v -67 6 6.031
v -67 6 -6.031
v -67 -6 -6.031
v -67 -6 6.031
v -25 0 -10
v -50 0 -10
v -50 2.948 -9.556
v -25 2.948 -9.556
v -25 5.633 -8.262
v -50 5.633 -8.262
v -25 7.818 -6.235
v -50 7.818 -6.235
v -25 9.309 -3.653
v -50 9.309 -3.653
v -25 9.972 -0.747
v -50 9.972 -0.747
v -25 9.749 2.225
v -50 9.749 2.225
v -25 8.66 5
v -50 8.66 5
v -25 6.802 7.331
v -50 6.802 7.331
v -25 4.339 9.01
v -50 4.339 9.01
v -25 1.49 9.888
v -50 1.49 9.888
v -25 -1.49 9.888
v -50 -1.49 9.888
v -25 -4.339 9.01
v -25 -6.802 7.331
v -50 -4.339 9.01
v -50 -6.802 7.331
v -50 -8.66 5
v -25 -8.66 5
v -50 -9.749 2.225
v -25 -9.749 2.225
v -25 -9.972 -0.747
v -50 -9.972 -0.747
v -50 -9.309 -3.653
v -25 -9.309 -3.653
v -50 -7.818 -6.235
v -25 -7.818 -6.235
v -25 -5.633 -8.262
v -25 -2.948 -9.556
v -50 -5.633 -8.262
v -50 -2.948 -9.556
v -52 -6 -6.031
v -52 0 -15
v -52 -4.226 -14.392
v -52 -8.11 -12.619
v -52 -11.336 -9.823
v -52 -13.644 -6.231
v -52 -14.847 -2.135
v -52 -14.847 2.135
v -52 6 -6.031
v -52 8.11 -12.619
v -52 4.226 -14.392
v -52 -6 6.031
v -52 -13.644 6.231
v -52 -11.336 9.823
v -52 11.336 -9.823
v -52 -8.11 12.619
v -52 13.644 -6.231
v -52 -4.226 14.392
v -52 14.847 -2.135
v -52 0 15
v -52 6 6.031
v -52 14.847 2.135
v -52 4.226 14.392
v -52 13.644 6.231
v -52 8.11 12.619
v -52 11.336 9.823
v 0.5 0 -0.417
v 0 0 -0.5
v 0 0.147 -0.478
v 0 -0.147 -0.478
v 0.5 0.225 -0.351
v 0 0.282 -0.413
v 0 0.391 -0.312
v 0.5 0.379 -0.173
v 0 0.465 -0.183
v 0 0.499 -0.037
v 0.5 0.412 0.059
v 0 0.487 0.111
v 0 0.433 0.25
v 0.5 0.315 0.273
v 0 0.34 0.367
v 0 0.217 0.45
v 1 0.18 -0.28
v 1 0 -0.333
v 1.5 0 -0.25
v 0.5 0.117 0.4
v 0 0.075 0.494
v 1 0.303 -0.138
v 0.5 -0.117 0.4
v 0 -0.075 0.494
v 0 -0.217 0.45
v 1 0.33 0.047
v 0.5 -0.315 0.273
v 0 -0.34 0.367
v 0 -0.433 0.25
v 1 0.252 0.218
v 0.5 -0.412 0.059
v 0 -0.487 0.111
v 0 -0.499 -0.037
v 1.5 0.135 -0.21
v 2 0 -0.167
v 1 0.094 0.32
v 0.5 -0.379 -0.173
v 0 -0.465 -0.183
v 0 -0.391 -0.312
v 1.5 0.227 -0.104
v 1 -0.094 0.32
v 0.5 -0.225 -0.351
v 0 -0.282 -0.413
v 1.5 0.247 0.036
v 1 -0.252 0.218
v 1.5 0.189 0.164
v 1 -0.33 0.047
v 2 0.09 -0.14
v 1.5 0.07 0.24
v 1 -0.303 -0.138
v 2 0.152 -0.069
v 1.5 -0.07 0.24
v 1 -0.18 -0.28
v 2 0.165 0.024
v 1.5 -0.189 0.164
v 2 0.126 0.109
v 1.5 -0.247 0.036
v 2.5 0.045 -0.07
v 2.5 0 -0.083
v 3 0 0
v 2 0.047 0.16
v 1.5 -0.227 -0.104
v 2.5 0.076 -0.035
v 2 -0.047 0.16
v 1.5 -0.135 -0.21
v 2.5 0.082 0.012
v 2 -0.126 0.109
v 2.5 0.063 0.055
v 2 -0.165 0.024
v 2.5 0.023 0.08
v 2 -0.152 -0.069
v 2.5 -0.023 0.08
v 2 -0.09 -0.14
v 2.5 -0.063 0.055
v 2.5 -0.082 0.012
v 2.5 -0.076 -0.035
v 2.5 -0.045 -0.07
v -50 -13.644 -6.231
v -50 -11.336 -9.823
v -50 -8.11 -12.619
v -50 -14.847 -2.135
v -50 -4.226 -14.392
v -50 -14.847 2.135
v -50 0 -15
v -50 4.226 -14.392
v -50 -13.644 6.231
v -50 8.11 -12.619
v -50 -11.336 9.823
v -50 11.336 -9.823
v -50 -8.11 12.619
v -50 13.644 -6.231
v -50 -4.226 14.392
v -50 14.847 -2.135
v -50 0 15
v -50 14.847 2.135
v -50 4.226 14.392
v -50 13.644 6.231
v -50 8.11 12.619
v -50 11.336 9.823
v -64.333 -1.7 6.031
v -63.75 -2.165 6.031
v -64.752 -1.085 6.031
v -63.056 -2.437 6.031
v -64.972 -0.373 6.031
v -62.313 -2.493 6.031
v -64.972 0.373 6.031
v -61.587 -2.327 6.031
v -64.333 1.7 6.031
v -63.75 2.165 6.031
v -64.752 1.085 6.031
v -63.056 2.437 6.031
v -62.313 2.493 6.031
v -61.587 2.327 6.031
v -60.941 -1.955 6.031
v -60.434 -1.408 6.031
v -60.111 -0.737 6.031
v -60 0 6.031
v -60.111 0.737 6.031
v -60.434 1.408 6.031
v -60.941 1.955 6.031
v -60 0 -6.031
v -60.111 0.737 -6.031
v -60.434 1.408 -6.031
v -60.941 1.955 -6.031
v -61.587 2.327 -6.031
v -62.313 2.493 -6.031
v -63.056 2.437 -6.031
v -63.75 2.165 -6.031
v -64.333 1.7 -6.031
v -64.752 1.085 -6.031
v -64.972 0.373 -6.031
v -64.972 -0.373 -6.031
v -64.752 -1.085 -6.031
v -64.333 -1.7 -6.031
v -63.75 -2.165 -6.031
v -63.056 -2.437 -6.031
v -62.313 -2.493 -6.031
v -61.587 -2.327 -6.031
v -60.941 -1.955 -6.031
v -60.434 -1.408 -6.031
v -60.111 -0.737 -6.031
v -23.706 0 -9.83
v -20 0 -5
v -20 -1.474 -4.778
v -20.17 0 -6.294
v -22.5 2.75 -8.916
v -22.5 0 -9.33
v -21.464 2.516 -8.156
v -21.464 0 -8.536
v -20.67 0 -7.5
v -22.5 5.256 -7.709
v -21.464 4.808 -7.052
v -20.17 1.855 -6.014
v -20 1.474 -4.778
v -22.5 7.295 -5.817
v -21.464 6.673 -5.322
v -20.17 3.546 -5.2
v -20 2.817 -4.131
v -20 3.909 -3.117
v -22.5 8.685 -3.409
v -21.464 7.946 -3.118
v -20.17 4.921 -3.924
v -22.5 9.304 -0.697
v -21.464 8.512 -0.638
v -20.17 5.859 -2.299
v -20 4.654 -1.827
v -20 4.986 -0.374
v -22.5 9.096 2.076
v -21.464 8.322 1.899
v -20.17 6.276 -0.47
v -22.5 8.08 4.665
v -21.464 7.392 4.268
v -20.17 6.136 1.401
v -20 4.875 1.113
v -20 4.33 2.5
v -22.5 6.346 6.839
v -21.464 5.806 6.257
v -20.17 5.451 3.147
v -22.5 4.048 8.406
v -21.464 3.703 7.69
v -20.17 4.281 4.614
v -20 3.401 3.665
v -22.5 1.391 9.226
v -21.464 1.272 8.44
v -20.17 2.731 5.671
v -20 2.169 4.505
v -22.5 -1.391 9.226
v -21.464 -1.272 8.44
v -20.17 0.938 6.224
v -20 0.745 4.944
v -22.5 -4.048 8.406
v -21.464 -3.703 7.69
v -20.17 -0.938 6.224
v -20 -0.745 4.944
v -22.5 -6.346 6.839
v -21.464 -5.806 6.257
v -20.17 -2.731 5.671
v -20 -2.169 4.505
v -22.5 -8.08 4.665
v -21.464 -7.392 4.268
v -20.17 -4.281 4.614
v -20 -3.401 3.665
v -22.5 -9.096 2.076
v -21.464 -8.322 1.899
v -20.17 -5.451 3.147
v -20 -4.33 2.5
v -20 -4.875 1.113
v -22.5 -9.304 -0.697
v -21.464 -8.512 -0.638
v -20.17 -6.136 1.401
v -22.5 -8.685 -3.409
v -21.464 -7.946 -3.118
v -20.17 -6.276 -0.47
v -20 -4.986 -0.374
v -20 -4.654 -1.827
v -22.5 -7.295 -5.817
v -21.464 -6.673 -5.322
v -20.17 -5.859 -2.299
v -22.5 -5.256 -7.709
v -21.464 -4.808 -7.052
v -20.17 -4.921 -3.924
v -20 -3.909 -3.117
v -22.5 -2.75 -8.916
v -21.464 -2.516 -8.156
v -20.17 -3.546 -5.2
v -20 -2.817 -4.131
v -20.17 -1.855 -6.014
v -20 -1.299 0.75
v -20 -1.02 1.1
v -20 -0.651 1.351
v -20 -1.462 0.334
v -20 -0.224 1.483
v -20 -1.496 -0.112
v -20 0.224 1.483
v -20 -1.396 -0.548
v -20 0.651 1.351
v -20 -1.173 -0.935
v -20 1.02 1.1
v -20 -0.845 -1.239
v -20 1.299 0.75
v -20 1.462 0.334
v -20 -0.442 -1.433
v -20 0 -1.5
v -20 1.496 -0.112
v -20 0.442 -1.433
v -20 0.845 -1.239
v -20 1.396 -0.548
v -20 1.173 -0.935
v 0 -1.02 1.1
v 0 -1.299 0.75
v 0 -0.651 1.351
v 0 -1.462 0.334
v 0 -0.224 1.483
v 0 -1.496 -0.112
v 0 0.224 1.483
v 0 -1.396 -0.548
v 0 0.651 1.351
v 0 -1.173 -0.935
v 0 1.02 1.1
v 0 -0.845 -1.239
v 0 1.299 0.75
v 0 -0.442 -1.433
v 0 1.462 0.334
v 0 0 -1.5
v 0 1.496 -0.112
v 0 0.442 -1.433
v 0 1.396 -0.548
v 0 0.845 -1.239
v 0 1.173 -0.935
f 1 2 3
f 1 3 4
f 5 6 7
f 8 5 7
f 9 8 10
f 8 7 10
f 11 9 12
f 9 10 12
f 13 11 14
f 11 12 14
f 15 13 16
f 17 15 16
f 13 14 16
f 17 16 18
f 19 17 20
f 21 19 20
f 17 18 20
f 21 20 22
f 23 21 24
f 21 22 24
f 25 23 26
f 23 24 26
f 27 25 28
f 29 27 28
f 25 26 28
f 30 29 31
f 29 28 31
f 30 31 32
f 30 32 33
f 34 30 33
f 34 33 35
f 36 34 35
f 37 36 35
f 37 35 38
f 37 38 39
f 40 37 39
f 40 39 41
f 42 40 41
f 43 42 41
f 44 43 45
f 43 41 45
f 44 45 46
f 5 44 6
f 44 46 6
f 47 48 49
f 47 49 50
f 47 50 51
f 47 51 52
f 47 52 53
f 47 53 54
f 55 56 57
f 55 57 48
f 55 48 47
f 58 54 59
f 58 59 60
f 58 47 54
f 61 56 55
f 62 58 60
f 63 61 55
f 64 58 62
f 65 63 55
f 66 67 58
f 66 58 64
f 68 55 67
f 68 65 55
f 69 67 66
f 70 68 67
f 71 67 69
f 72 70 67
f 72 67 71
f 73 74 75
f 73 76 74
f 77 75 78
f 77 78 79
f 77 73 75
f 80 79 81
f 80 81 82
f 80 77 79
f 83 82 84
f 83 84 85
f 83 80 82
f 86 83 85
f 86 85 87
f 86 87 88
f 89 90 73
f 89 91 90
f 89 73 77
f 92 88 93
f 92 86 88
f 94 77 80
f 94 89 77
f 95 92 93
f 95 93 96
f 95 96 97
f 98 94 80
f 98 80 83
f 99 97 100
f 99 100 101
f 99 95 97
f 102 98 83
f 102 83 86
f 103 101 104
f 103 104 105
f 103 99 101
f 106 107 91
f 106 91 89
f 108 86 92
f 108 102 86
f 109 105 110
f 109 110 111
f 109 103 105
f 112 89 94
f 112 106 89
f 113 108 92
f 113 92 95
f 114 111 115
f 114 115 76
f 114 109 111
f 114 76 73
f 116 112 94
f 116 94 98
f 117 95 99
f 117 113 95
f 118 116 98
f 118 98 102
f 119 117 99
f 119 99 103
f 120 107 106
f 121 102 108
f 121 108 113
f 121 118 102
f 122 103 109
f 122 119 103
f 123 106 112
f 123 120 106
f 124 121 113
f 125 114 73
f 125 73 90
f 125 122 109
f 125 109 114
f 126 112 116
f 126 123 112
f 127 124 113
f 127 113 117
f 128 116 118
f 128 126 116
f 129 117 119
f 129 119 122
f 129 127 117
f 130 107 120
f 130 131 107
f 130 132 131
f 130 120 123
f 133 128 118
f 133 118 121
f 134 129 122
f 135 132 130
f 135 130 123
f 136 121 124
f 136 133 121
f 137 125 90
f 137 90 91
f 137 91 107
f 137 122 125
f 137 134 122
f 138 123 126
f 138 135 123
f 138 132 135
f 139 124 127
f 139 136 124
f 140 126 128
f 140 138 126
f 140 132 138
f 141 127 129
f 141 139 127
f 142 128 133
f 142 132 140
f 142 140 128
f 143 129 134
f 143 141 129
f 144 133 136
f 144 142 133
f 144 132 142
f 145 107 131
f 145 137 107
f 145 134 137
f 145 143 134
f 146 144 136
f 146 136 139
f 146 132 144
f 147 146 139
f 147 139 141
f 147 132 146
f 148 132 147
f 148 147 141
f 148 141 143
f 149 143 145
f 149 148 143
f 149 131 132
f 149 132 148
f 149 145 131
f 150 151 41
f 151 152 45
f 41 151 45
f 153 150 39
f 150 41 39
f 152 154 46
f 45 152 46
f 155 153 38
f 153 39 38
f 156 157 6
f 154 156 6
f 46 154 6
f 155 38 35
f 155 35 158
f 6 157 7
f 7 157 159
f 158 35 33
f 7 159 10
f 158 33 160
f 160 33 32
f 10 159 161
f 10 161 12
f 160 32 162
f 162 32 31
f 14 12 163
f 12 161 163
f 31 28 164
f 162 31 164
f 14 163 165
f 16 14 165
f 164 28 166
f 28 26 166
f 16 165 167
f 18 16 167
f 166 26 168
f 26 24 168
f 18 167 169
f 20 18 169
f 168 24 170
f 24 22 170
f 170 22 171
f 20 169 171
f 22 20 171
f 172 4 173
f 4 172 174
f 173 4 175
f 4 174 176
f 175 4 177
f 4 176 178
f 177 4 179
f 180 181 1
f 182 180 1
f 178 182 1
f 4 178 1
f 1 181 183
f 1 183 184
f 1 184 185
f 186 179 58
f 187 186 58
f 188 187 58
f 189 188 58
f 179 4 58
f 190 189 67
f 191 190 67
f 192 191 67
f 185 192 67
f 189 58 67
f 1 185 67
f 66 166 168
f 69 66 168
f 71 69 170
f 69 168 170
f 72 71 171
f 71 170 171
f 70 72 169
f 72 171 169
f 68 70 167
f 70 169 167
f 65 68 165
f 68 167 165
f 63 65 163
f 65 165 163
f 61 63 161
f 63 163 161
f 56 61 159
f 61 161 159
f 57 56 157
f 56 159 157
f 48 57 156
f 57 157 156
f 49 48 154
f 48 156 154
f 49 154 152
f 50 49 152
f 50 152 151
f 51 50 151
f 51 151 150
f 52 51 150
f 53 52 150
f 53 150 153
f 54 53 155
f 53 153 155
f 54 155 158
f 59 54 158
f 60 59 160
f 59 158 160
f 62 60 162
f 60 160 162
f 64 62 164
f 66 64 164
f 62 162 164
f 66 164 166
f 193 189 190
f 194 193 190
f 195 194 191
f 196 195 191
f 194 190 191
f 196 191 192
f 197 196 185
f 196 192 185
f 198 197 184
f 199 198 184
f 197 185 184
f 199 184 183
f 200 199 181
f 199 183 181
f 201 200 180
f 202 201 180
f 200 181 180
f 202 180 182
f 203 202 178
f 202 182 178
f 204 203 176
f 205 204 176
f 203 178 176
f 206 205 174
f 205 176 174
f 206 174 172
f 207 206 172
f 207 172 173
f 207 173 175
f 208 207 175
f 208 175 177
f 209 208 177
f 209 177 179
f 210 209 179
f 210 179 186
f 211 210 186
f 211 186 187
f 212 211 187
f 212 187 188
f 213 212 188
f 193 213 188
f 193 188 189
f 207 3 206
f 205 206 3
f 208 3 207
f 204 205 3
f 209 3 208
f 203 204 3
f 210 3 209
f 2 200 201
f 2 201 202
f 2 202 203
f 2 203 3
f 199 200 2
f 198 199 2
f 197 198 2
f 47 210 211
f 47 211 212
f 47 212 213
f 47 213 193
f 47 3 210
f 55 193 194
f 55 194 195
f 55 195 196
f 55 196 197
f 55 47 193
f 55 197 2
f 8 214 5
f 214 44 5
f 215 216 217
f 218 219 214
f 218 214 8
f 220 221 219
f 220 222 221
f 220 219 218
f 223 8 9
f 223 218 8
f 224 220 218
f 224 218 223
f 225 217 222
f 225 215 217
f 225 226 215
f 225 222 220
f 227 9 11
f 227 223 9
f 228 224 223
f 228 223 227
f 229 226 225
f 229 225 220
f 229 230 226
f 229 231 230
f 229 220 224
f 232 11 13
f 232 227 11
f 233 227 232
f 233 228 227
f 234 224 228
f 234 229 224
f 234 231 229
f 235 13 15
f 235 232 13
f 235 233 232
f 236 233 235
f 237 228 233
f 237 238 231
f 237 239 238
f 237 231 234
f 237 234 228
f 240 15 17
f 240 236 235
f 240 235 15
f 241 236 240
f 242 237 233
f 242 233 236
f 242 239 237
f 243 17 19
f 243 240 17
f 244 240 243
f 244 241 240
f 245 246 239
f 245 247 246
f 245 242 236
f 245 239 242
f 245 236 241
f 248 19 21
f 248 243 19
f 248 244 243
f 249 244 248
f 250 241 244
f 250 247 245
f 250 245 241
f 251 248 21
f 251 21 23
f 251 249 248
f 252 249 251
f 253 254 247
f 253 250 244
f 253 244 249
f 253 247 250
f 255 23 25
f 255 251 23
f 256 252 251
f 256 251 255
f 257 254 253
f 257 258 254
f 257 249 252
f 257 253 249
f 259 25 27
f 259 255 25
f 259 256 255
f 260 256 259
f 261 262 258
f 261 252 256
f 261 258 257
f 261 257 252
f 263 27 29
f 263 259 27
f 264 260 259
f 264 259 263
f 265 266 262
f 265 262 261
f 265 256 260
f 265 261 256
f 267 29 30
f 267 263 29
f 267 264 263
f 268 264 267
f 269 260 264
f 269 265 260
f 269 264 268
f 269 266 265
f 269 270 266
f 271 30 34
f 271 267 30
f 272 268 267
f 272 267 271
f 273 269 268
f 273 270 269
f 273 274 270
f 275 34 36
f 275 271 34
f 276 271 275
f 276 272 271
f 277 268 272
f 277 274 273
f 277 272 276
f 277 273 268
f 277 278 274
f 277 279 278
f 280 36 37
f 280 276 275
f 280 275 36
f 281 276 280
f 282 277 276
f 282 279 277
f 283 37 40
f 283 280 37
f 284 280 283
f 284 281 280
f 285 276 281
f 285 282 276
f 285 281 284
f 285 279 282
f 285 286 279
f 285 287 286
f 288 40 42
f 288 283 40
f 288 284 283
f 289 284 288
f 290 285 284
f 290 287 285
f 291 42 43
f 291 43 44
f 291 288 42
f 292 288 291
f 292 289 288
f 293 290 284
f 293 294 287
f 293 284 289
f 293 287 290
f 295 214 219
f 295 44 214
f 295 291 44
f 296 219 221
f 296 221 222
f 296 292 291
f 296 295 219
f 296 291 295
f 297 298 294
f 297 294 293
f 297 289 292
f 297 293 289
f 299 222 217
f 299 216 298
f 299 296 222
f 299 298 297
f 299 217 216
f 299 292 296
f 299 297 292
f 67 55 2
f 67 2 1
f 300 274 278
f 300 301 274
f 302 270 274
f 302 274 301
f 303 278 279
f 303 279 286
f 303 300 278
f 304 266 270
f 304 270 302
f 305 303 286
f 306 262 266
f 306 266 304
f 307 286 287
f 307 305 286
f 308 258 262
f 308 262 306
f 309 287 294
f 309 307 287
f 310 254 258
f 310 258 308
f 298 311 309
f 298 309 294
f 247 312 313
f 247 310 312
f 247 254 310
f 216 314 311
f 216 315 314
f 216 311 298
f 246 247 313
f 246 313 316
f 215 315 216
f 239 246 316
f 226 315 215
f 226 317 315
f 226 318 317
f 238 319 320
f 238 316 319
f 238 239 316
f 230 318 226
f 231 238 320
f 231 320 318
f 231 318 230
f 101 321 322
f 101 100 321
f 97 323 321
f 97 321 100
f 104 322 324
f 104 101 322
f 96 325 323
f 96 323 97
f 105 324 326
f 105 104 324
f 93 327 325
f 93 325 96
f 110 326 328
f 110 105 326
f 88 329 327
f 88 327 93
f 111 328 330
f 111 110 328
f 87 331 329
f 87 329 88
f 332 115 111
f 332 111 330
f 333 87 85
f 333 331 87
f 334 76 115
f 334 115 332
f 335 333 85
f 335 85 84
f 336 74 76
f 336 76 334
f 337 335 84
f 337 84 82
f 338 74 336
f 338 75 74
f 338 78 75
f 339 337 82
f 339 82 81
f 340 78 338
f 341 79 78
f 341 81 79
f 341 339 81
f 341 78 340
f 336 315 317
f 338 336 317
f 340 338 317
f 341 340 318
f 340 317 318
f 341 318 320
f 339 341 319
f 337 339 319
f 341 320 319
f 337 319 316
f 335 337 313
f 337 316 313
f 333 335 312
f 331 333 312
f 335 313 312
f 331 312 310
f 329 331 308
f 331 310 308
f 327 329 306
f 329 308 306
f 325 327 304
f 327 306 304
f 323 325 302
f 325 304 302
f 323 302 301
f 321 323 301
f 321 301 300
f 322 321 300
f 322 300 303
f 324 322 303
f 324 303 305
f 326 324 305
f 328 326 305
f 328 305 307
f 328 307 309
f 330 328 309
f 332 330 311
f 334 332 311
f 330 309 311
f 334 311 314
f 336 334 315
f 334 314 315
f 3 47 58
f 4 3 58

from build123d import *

# Parameters (mm, degrees)
SKETCH1_R             = 10
BOSS_EXTRUDE1_DEPTH   = 30
SKETCH4_R             = 15
BOSS_EXTRUDE2_DEPTH   = 2
FILLET1_R             = 5
SKETCH6_R             = 1.5
BOSS_EXTRUDE3_DEPTH   = 20
SKETCH7_W             = 12.06257879
SKETCH7_H             = 12
BOSS_EXTRUDE4_DEPTH   = 15
SKETCH8_R             = 2.5
CUT_EXTRUDE2_DEPTH    = 22.031289395
BODY_MOVE_COPY5_ANGLE = 90


with BuildPart() as part:
    # Sketch1 → Boss-Extrude1 (new body)
    with BuildSketch(Plane.XY):
        Circle(SKETCH1_R)
    extrude(amount=BOSS_EXTRUDE1_DEPTH)

    # Sketch4 → Boss-Extrude2 (add)
    with BuildSketch(Plane(origin=(0, 0, 0), x_dir=(-1, 0, 0), z_dir=(0, 0, -1))):
        Circle(SKETCH4_R)
    extrude(amount=BOSS_EXTRUDE2_DEPTH)

    # Fillet1
    fillet1_edges = [part.edges().sort_by_distance(p)[0] for p in [
        (-10, 0, 30),
    ]]
    fillet(fillet1_edges, radius=FILLET1_R)

    # Sketch6 → Boss-Extrude3 (add)
    with BuildSketch(Plane.XY.offset(30)):
        Circle(SKETCH6_R)
    extrude(amount=BOSS_EXTRUDE3_DEPTH)

    # Sketch7 → Boss-Extrude4 (add)
    with BuildSketch(Plane(origin=(0, 0, -2), x_dir=(-1, 0, 0), z_dir=(0, 0, -1))):
        Rectangle(SKETCH7_W, SKETCH7_H)
    extrude(amount=BOSS_EXTRUDE4_DEPTH)

    # Sketch8 → Cut-Extrude2 (cut, through all)
    with BuildSketch(Plane.ZY.offset(6.031289395)):
        with Locations((-12.5, 0)):
            Circle(SKETCH8_R)
    extrude(amount=-CUT_EXTRUDE2_DEPTH, mode=Mode.SUBTRACT)

    # Sketch15 → Revolve2 (revolve)
    with BuildSketch(Plane(origin=(0, 0, 0), x_dir=(1, 0, 0), z_dir=(0, 1, 0))):
        Polygon((0.5, -50), (0, -53), (0, -50), align=None)
    revolve(axis=Axis((0, 0, 50), (0, 0, 1)))


with BuildPart() as part_1:
    # Body-Move/Copy3: moved
    add(part.part.moved(Location((0, 0, -50))))


with BuildPart() as part_2:
    # Body-Move/Copy5: moved
    add(part_1.part.rotate(Axis((0, 0, 0), (0, 1, 0)), BODY_MOVE_COPY5_ANGLE))


solid = part_2.part
